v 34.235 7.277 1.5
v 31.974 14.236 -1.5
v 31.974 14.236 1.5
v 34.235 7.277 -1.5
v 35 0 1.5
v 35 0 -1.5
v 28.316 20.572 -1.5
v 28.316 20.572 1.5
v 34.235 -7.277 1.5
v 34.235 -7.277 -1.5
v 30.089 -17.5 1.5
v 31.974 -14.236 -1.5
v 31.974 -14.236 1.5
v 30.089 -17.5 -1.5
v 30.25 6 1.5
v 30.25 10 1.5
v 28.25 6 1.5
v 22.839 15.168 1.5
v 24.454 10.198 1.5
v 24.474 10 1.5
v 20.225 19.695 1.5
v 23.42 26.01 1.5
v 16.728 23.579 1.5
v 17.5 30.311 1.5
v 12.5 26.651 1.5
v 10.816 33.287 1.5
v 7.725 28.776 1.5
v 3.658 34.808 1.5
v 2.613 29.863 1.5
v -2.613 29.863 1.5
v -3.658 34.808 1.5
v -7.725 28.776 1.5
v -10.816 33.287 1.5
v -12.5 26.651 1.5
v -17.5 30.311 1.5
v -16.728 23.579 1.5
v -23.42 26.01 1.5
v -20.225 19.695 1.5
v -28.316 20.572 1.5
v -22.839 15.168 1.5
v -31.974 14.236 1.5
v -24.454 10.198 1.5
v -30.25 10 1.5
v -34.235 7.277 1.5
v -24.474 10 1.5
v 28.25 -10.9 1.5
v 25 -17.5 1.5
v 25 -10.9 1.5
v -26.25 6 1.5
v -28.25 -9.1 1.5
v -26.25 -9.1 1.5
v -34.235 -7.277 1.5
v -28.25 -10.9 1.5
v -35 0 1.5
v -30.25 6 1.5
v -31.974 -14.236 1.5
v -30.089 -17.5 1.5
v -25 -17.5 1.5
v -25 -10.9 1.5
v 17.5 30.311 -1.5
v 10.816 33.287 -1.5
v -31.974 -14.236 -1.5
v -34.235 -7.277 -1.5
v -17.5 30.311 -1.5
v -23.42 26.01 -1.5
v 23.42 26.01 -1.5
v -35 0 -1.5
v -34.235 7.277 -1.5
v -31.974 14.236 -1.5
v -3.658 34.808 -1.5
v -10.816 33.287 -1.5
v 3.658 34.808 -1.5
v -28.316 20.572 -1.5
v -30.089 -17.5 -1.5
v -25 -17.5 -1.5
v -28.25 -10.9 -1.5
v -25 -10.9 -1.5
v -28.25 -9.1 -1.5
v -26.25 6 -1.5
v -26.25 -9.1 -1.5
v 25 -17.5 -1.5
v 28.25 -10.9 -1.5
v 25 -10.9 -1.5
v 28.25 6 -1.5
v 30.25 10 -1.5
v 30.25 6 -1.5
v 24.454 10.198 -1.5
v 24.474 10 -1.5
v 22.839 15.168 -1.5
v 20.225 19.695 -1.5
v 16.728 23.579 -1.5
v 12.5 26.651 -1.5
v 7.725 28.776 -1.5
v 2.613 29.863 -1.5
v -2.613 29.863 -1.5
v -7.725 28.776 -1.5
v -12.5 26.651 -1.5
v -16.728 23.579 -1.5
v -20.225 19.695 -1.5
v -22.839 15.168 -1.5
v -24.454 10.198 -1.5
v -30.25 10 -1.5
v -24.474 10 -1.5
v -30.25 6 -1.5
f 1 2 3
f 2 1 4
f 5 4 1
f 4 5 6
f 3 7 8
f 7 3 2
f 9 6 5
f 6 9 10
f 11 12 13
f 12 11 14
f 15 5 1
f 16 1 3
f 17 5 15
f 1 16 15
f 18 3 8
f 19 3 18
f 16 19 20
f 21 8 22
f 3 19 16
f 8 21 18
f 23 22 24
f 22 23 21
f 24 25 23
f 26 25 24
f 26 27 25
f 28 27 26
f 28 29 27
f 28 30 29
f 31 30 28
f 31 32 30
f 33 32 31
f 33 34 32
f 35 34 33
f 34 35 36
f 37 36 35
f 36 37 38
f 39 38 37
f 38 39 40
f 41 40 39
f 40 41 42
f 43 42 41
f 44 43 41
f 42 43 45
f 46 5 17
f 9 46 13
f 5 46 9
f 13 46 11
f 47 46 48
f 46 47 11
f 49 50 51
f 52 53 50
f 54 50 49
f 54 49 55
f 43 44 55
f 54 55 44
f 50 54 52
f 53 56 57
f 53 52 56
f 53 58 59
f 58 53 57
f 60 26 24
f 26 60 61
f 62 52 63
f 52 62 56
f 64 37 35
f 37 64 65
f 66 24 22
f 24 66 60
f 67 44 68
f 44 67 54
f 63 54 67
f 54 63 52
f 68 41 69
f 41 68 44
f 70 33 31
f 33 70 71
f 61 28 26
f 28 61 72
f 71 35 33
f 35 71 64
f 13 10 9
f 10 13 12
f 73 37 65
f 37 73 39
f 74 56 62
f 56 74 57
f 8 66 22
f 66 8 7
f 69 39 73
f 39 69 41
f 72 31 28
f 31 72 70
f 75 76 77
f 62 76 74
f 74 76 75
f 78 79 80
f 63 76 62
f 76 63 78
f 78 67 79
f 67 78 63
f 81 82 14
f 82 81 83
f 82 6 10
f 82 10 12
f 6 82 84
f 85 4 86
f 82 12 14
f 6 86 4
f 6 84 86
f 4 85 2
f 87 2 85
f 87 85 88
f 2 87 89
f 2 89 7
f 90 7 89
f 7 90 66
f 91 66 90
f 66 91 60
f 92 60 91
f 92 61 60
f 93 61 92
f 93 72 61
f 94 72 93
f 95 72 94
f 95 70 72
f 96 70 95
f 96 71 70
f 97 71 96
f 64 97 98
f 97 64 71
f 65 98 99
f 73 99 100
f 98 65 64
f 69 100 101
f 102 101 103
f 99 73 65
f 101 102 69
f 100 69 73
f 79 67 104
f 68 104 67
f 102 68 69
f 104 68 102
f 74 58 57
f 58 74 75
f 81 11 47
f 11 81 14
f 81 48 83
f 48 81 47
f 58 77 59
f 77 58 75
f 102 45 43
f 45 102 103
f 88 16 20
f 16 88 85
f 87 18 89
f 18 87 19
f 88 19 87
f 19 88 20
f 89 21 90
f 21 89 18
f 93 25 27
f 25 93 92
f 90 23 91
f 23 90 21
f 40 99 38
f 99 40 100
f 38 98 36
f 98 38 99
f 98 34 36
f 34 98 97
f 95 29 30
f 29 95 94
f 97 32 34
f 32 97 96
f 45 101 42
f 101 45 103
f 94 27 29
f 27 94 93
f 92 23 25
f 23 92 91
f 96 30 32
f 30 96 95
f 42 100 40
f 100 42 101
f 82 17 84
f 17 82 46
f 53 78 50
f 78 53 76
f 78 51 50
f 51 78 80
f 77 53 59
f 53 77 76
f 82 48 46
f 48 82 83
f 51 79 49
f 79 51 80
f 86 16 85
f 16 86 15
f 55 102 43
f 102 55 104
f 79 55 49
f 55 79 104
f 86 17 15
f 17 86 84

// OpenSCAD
 module halfcircle(h)
{
	difference()
	{
		cylinder(h, r=35, center=true);
		translate([0, -35, 0])
			cube([70, 35, h+1], center=true);
	}
}

module horseshoe(height)
{
	difference()
	{
		halfcircle(height);
		union()
		{
		   translate([0, -20, 0])
			cube([50, 60, height+1], center=true);
		   translate([0, 5, 0])
			cylinder(height+10, r=25, center=true);
		}
	}
}

module mount(height)
{
	difference()
	{
		horseshoe(height);
		translate([0, -10, 0])
			cube([56.5, 1.8, 100], center=true);
		translate([1, -1.05, 0])
			cube([54.5, 16.2, 100], center=true);
		translate([0, 8, 0])
			cube([60.5, 4.0, 100], center=true);			
	}
}


mount(3);
